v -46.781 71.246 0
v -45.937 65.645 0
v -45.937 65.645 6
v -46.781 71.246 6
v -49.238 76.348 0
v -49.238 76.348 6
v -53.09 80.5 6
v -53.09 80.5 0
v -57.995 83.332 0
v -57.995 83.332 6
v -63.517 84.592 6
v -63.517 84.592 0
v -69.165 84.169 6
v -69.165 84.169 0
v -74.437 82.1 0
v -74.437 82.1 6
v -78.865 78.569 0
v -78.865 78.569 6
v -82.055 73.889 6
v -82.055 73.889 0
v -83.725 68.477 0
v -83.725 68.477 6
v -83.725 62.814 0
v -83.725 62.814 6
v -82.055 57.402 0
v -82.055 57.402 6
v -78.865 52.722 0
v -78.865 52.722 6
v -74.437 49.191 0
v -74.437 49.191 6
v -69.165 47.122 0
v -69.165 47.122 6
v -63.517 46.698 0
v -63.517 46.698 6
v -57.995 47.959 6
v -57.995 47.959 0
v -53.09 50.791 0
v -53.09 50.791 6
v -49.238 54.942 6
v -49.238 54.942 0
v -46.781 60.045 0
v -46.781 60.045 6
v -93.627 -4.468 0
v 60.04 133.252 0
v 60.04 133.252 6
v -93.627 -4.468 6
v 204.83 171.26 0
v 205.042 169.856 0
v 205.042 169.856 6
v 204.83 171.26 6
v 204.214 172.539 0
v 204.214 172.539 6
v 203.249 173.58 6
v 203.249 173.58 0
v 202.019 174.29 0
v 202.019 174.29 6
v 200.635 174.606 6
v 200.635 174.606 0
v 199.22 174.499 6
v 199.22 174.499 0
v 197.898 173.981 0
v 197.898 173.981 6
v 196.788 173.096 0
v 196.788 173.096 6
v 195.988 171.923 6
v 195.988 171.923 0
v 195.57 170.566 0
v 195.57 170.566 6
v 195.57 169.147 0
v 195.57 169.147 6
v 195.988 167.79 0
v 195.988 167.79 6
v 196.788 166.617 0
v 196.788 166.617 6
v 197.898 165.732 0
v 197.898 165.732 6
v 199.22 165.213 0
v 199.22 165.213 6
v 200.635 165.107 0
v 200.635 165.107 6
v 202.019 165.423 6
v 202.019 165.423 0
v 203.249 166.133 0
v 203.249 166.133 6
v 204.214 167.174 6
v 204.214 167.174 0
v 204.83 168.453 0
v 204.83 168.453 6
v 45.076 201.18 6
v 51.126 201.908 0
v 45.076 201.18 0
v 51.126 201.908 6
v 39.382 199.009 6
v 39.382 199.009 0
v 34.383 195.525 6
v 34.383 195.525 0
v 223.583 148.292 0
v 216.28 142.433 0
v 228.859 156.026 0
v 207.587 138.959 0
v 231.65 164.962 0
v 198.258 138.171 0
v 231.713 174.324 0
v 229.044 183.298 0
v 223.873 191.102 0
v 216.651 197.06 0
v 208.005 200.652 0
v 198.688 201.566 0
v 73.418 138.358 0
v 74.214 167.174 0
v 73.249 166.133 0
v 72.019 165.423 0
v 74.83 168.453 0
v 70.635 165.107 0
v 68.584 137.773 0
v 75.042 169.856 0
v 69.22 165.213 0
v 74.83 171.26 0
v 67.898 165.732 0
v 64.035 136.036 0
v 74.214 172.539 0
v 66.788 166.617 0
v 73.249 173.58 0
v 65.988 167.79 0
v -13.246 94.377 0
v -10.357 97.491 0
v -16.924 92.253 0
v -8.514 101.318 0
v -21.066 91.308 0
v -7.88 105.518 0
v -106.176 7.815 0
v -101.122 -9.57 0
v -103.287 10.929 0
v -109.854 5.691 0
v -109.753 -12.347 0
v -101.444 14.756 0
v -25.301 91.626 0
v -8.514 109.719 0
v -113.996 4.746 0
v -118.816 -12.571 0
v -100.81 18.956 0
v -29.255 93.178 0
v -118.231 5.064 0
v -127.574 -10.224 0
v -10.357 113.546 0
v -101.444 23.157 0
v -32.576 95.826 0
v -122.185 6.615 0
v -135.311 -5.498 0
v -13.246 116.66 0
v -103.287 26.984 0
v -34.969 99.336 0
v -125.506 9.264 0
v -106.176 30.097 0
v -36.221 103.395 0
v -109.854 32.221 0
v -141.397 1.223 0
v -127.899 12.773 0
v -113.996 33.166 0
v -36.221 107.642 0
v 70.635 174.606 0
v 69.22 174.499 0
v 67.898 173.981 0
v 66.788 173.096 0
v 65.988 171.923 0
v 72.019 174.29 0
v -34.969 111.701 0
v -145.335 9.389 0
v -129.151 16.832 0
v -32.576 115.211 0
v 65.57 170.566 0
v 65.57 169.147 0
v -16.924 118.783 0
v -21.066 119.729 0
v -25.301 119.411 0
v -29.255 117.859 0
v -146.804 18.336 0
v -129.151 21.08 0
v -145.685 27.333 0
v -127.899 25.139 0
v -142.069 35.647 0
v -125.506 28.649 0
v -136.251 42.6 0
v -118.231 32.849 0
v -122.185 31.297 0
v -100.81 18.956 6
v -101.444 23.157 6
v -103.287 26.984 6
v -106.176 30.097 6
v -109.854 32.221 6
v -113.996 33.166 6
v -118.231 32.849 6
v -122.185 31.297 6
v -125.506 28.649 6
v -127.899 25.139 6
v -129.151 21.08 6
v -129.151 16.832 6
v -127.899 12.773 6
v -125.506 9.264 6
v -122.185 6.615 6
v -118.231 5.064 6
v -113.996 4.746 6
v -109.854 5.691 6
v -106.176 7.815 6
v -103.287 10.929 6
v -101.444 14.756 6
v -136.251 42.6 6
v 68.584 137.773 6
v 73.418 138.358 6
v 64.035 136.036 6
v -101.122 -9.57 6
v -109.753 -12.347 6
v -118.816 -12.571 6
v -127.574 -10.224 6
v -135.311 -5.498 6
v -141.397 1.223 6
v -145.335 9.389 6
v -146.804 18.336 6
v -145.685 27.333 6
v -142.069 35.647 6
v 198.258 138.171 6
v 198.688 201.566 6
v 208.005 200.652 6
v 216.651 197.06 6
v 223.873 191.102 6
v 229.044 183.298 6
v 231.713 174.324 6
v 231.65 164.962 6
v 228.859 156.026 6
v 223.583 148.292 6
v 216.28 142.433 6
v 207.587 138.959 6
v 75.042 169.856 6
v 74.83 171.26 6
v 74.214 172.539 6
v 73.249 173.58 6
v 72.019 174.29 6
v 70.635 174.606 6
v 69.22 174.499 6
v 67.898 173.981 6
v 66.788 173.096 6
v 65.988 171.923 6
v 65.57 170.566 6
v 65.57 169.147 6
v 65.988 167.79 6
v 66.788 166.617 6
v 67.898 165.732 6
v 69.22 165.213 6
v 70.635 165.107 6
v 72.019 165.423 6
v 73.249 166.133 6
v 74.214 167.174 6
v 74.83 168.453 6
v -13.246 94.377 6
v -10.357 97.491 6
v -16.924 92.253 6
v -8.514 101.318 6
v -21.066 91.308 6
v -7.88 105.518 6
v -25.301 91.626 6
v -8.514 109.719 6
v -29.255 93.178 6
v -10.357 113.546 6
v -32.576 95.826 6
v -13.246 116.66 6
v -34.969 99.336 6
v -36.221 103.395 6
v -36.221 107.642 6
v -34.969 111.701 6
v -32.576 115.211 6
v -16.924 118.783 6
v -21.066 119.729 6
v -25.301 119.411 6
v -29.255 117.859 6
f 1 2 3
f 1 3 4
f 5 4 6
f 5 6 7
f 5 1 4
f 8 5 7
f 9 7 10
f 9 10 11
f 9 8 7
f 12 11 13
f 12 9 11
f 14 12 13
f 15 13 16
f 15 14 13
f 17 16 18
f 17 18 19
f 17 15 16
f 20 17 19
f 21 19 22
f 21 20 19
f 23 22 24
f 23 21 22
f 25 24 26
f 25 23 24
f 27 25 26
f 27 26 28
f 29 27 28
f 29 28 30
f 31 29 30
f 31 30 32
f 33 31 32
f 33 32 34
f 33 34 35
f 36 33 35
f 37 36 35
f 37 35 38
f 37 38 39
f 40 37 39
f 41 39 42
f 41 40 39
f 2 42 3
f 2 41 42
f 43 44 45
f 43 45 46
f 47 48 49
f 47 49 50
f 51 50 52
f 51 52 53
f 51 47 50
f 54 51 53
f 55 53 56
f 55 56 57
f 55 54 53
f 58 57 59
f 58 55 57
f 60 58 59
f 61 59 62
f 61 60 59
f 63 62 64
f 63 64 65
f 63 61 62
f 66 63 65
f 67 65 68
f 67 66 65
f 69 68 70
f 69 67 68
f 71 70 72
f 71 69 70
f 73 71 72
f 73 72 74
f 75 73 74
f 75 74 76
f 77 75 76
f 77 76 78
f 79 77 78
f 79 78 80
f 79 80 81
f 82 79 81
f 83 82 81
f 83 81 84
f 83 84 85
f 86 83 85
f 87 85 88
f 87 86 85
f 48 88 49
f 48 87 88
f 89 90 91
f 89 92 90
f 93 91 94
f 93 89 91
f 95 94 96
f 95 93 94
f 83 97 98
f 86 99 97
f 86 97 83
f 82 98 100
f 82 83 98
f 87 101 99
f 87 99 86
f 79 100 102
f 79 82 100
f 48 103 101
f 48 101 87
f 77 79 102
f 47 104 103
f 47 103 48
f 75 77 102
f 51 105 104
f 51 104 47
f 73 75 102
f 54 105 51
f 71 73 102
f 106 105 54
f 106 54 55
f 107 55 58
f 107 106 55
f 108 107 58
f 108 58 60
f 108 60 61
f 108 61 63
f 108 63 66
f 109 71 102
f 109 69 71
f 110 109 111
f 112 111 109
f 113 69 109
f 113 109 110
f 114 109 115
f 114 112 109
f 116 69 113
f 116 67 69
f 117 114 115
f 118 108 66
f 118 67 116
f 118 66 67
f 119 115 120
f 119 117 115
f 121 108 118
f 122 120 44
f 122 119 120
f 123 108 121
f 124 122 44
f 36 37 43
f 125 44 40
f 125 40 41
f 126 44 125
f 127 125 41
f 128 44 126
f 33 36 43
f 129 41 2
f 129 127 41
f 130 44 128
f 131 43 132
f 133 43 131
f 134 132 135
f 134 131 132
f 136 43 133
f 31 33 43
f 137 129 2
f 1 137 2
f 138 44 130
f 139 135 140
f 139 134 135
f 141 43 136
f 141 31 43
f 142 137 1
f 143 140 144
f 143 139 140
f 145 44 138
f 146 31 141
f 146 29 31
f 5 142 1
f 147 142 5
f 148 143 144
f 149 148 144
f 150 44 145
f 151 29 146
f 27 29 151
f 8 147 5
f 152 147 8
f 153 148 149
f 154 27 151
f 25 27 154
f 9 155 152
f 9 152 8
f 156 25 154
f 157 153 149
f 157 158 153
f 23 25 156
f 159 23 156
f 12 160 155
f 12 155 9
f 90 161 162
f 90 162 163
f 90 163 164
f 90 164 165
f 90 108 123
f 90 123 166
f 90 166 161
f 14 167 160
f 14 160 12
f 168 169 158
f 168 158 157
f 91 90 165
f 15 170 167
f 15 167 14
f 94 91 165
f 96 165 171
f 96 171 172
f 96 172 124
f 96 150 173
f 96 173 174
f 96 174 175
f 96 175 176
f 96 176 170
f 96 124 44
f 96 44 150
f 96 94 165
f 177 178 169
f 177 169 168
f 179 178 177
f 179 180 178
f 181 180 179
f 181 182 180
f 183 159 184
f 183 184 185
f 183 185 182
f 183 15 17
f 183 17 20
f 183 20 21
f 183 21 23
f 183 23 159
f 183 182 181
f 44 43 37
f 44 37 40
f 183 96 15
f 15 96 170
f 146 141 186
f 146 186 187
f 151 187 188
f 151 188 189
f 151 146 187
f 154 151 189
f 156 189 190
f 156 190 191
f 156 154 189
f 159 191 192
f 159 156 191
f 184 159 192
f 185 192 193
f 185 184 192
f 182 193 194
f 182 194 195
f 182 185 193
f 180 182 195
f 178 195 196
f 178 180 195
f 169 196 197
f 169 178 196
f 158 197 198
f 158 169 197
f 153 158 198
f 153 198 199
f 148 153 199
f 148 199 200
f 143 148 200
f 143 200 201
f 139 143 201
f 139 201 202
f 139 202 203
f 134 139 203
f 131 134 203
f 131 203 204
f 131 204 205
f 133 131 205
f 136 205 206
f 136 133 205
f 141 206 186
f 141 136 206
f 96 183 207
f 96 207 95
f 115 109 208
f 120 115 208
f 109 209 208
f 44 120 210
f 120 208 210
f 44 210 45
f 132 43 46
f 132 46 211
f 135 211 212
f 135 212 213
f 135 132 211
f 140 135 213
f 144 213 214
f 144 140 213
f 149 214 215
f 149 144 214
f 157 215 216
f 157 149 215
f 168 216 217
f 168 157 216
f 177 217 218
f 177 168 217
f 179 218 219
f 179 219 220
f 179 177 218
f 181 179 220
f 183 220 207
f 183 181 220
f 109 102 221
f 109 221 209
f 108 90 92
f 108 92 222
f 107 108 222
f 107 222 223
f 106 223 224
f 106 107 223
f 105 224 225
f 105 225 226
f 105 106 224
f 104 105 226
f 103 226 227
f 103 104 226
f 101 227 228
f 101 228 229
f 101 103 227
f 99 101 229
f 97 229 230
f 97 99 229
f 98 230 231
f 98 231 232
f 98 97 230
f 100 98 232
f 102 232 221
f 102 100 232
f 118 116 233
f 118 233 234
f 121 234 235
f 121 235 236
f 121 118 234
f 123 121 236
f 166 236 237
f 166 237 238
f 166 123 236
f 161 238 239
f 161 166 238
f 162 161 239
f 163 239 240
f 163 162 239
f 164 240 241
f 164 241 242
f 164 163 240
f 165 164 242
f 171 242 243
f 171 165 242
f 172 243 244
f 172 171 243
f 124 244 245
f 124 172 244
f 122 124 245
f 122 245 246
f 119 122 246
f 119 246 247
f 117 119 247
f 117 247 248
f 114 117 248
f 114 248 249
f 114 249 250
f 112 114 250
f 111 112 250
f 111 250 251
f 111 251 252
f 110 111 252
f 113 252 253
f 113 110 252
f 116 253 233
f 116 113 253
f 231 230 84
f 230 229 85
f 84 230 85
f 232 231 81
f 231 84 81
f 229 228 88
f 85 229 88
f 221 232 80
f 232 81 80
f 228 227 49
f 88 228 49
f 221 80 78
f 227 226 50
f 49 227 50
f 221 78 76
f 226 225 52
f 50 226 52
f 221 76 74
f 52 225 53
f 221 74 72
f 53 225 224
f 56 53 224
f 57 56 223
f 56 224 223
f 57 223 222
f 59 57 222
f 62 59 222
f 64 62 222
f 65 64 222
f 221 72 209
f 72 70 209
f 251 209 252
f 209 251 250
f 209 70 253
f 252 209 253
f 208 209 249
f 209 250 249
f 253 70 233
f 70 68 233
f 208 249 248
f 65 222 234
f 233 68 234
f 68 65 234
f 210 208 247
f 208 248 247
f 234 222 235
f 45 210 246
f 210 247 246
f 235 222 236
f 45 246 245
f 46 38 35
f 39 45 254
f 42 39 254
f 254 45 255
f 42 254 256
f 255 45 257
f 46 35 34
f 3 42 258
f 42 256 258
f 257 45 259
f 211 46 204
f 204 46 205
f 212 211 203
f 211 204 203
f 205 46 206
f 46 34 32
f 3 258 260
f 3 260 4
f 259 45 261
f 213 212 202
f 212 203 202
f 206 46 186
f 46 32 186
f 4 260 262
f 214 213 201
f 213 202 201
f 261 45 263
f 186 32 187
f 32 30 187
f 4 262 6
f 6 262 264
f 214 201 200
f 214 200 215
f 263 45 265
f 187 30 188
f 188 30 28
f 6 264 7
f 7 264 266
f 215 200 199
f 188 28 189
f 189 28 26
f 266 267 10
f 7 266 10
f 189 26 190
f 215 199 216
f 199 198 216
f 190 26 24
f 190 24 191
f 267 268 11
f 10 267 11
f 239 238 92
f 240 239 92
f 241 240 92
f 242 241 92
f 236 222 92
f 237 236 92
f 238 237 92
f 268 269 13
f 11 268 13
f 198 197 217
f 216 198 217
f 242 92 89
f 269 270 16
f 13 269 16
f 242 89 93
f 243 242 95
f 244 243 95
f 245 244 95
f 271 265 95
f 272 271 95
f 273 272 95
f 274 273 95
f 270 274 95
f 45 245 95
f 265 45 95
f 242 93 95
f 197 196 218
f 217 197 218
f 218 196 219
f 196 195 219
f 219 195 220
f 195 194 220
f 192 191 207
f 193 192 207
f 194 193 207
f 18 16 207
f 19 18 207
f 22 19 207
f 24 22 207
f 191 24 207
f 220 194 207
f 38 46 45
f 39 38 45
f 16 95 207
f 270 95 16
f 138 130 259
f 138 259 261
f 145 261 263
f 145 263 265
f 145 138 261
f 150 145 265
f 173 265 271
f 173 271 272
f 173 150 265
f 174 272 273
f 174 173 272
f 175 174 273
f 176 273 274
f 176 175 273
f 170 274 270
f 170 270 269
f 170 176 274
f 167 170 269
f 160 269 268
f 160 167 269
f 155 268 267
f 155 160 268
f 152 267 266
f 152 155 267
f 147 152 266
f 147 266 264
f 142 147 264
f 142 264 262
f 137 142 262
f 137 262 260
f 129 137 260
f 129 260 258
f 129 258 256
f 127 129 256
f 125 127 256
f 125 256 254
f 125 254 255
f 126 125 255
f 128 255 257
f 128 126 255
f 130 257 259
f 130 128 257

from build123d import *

# Parameters (mm, degrees)
CROQUIS1_R              = 14.25
CROQUIS1_R_2            = 4.7625
CROQUIS1_R_3            = 19
SALIENTE_EXTRUIR1_DEPTH = 6
REDONDEO1_R             = 25
REDONDEO2_R             = 19.999999878


with BuildPart() as part:
    # Croquis1 → Saliente-Extruir1 (new body)
    with BuildSketch(Plane.XY):
        with BuildLine():
            Line((41.52932014, 201.930330406), (198.68793394, 201.566461221))
            ThreePointArc((198.68793394, 201.566461221), (232.028588704, 169.640855787), (198.25760714, 138.170801026))
            Line((198.25760714, 138.170801026), (65.750390297, 138.369874115))
            Line((65.750390297, 138.369874115), (-93.627365444, -4.467720371))
            ThreePointArc((-93.627365444, -4.467720371), (-138.59478698, -2.355669211), (-136.250697374, 42.600253688))
            Line((-136.250697374, 42.600253688), (41.52932014, 201.930330406))
        make_face()
        with Locations((-115.060486547, 18.956280563)):
            Circle(CROQUIS1_R, mode=Mode.SUBTRACT)
        with Locations((-22.130431971, 105.518425617)):
            Circle(CROQUIS1_R, mode=Mode.SUBTRACT)
        with Locations((200.27932014, 169.856368349)):
            Circle(CROQUIS1_R_2, mode=Mode.SUBTRACT)
        with Locations((70.27932014, 169.856368349)):
            Circle(CROQUIS1_R_2, mode=Mode.SUBTRACT)
        with Locations((-64.936795693, 65.645311557)):
            Circle(CROQUIS1_R_3, mode=Mode.SUBTRACT)
    extrude(amount=SALIENTE_EXTRUIR1_DEPTH)

    # Redondeo1
    redondeo1_edges = [part.edges().sort_by_distance(p)[0] for p in [
        (41.52932014, 201.930330406, 3),
    ]]
    fillet(redondeo1_edges, radius=REDONDEO1_R)

    # Redondeo2
    redondeo2_edges = [part.edges().sort_by_distance(p)[0] for p in [
        (65.750390297, 138.369874115, 3),
    ]]
    fillet(redondeo2_edges, radius=REDONDEO2_R)


solid = part.part
